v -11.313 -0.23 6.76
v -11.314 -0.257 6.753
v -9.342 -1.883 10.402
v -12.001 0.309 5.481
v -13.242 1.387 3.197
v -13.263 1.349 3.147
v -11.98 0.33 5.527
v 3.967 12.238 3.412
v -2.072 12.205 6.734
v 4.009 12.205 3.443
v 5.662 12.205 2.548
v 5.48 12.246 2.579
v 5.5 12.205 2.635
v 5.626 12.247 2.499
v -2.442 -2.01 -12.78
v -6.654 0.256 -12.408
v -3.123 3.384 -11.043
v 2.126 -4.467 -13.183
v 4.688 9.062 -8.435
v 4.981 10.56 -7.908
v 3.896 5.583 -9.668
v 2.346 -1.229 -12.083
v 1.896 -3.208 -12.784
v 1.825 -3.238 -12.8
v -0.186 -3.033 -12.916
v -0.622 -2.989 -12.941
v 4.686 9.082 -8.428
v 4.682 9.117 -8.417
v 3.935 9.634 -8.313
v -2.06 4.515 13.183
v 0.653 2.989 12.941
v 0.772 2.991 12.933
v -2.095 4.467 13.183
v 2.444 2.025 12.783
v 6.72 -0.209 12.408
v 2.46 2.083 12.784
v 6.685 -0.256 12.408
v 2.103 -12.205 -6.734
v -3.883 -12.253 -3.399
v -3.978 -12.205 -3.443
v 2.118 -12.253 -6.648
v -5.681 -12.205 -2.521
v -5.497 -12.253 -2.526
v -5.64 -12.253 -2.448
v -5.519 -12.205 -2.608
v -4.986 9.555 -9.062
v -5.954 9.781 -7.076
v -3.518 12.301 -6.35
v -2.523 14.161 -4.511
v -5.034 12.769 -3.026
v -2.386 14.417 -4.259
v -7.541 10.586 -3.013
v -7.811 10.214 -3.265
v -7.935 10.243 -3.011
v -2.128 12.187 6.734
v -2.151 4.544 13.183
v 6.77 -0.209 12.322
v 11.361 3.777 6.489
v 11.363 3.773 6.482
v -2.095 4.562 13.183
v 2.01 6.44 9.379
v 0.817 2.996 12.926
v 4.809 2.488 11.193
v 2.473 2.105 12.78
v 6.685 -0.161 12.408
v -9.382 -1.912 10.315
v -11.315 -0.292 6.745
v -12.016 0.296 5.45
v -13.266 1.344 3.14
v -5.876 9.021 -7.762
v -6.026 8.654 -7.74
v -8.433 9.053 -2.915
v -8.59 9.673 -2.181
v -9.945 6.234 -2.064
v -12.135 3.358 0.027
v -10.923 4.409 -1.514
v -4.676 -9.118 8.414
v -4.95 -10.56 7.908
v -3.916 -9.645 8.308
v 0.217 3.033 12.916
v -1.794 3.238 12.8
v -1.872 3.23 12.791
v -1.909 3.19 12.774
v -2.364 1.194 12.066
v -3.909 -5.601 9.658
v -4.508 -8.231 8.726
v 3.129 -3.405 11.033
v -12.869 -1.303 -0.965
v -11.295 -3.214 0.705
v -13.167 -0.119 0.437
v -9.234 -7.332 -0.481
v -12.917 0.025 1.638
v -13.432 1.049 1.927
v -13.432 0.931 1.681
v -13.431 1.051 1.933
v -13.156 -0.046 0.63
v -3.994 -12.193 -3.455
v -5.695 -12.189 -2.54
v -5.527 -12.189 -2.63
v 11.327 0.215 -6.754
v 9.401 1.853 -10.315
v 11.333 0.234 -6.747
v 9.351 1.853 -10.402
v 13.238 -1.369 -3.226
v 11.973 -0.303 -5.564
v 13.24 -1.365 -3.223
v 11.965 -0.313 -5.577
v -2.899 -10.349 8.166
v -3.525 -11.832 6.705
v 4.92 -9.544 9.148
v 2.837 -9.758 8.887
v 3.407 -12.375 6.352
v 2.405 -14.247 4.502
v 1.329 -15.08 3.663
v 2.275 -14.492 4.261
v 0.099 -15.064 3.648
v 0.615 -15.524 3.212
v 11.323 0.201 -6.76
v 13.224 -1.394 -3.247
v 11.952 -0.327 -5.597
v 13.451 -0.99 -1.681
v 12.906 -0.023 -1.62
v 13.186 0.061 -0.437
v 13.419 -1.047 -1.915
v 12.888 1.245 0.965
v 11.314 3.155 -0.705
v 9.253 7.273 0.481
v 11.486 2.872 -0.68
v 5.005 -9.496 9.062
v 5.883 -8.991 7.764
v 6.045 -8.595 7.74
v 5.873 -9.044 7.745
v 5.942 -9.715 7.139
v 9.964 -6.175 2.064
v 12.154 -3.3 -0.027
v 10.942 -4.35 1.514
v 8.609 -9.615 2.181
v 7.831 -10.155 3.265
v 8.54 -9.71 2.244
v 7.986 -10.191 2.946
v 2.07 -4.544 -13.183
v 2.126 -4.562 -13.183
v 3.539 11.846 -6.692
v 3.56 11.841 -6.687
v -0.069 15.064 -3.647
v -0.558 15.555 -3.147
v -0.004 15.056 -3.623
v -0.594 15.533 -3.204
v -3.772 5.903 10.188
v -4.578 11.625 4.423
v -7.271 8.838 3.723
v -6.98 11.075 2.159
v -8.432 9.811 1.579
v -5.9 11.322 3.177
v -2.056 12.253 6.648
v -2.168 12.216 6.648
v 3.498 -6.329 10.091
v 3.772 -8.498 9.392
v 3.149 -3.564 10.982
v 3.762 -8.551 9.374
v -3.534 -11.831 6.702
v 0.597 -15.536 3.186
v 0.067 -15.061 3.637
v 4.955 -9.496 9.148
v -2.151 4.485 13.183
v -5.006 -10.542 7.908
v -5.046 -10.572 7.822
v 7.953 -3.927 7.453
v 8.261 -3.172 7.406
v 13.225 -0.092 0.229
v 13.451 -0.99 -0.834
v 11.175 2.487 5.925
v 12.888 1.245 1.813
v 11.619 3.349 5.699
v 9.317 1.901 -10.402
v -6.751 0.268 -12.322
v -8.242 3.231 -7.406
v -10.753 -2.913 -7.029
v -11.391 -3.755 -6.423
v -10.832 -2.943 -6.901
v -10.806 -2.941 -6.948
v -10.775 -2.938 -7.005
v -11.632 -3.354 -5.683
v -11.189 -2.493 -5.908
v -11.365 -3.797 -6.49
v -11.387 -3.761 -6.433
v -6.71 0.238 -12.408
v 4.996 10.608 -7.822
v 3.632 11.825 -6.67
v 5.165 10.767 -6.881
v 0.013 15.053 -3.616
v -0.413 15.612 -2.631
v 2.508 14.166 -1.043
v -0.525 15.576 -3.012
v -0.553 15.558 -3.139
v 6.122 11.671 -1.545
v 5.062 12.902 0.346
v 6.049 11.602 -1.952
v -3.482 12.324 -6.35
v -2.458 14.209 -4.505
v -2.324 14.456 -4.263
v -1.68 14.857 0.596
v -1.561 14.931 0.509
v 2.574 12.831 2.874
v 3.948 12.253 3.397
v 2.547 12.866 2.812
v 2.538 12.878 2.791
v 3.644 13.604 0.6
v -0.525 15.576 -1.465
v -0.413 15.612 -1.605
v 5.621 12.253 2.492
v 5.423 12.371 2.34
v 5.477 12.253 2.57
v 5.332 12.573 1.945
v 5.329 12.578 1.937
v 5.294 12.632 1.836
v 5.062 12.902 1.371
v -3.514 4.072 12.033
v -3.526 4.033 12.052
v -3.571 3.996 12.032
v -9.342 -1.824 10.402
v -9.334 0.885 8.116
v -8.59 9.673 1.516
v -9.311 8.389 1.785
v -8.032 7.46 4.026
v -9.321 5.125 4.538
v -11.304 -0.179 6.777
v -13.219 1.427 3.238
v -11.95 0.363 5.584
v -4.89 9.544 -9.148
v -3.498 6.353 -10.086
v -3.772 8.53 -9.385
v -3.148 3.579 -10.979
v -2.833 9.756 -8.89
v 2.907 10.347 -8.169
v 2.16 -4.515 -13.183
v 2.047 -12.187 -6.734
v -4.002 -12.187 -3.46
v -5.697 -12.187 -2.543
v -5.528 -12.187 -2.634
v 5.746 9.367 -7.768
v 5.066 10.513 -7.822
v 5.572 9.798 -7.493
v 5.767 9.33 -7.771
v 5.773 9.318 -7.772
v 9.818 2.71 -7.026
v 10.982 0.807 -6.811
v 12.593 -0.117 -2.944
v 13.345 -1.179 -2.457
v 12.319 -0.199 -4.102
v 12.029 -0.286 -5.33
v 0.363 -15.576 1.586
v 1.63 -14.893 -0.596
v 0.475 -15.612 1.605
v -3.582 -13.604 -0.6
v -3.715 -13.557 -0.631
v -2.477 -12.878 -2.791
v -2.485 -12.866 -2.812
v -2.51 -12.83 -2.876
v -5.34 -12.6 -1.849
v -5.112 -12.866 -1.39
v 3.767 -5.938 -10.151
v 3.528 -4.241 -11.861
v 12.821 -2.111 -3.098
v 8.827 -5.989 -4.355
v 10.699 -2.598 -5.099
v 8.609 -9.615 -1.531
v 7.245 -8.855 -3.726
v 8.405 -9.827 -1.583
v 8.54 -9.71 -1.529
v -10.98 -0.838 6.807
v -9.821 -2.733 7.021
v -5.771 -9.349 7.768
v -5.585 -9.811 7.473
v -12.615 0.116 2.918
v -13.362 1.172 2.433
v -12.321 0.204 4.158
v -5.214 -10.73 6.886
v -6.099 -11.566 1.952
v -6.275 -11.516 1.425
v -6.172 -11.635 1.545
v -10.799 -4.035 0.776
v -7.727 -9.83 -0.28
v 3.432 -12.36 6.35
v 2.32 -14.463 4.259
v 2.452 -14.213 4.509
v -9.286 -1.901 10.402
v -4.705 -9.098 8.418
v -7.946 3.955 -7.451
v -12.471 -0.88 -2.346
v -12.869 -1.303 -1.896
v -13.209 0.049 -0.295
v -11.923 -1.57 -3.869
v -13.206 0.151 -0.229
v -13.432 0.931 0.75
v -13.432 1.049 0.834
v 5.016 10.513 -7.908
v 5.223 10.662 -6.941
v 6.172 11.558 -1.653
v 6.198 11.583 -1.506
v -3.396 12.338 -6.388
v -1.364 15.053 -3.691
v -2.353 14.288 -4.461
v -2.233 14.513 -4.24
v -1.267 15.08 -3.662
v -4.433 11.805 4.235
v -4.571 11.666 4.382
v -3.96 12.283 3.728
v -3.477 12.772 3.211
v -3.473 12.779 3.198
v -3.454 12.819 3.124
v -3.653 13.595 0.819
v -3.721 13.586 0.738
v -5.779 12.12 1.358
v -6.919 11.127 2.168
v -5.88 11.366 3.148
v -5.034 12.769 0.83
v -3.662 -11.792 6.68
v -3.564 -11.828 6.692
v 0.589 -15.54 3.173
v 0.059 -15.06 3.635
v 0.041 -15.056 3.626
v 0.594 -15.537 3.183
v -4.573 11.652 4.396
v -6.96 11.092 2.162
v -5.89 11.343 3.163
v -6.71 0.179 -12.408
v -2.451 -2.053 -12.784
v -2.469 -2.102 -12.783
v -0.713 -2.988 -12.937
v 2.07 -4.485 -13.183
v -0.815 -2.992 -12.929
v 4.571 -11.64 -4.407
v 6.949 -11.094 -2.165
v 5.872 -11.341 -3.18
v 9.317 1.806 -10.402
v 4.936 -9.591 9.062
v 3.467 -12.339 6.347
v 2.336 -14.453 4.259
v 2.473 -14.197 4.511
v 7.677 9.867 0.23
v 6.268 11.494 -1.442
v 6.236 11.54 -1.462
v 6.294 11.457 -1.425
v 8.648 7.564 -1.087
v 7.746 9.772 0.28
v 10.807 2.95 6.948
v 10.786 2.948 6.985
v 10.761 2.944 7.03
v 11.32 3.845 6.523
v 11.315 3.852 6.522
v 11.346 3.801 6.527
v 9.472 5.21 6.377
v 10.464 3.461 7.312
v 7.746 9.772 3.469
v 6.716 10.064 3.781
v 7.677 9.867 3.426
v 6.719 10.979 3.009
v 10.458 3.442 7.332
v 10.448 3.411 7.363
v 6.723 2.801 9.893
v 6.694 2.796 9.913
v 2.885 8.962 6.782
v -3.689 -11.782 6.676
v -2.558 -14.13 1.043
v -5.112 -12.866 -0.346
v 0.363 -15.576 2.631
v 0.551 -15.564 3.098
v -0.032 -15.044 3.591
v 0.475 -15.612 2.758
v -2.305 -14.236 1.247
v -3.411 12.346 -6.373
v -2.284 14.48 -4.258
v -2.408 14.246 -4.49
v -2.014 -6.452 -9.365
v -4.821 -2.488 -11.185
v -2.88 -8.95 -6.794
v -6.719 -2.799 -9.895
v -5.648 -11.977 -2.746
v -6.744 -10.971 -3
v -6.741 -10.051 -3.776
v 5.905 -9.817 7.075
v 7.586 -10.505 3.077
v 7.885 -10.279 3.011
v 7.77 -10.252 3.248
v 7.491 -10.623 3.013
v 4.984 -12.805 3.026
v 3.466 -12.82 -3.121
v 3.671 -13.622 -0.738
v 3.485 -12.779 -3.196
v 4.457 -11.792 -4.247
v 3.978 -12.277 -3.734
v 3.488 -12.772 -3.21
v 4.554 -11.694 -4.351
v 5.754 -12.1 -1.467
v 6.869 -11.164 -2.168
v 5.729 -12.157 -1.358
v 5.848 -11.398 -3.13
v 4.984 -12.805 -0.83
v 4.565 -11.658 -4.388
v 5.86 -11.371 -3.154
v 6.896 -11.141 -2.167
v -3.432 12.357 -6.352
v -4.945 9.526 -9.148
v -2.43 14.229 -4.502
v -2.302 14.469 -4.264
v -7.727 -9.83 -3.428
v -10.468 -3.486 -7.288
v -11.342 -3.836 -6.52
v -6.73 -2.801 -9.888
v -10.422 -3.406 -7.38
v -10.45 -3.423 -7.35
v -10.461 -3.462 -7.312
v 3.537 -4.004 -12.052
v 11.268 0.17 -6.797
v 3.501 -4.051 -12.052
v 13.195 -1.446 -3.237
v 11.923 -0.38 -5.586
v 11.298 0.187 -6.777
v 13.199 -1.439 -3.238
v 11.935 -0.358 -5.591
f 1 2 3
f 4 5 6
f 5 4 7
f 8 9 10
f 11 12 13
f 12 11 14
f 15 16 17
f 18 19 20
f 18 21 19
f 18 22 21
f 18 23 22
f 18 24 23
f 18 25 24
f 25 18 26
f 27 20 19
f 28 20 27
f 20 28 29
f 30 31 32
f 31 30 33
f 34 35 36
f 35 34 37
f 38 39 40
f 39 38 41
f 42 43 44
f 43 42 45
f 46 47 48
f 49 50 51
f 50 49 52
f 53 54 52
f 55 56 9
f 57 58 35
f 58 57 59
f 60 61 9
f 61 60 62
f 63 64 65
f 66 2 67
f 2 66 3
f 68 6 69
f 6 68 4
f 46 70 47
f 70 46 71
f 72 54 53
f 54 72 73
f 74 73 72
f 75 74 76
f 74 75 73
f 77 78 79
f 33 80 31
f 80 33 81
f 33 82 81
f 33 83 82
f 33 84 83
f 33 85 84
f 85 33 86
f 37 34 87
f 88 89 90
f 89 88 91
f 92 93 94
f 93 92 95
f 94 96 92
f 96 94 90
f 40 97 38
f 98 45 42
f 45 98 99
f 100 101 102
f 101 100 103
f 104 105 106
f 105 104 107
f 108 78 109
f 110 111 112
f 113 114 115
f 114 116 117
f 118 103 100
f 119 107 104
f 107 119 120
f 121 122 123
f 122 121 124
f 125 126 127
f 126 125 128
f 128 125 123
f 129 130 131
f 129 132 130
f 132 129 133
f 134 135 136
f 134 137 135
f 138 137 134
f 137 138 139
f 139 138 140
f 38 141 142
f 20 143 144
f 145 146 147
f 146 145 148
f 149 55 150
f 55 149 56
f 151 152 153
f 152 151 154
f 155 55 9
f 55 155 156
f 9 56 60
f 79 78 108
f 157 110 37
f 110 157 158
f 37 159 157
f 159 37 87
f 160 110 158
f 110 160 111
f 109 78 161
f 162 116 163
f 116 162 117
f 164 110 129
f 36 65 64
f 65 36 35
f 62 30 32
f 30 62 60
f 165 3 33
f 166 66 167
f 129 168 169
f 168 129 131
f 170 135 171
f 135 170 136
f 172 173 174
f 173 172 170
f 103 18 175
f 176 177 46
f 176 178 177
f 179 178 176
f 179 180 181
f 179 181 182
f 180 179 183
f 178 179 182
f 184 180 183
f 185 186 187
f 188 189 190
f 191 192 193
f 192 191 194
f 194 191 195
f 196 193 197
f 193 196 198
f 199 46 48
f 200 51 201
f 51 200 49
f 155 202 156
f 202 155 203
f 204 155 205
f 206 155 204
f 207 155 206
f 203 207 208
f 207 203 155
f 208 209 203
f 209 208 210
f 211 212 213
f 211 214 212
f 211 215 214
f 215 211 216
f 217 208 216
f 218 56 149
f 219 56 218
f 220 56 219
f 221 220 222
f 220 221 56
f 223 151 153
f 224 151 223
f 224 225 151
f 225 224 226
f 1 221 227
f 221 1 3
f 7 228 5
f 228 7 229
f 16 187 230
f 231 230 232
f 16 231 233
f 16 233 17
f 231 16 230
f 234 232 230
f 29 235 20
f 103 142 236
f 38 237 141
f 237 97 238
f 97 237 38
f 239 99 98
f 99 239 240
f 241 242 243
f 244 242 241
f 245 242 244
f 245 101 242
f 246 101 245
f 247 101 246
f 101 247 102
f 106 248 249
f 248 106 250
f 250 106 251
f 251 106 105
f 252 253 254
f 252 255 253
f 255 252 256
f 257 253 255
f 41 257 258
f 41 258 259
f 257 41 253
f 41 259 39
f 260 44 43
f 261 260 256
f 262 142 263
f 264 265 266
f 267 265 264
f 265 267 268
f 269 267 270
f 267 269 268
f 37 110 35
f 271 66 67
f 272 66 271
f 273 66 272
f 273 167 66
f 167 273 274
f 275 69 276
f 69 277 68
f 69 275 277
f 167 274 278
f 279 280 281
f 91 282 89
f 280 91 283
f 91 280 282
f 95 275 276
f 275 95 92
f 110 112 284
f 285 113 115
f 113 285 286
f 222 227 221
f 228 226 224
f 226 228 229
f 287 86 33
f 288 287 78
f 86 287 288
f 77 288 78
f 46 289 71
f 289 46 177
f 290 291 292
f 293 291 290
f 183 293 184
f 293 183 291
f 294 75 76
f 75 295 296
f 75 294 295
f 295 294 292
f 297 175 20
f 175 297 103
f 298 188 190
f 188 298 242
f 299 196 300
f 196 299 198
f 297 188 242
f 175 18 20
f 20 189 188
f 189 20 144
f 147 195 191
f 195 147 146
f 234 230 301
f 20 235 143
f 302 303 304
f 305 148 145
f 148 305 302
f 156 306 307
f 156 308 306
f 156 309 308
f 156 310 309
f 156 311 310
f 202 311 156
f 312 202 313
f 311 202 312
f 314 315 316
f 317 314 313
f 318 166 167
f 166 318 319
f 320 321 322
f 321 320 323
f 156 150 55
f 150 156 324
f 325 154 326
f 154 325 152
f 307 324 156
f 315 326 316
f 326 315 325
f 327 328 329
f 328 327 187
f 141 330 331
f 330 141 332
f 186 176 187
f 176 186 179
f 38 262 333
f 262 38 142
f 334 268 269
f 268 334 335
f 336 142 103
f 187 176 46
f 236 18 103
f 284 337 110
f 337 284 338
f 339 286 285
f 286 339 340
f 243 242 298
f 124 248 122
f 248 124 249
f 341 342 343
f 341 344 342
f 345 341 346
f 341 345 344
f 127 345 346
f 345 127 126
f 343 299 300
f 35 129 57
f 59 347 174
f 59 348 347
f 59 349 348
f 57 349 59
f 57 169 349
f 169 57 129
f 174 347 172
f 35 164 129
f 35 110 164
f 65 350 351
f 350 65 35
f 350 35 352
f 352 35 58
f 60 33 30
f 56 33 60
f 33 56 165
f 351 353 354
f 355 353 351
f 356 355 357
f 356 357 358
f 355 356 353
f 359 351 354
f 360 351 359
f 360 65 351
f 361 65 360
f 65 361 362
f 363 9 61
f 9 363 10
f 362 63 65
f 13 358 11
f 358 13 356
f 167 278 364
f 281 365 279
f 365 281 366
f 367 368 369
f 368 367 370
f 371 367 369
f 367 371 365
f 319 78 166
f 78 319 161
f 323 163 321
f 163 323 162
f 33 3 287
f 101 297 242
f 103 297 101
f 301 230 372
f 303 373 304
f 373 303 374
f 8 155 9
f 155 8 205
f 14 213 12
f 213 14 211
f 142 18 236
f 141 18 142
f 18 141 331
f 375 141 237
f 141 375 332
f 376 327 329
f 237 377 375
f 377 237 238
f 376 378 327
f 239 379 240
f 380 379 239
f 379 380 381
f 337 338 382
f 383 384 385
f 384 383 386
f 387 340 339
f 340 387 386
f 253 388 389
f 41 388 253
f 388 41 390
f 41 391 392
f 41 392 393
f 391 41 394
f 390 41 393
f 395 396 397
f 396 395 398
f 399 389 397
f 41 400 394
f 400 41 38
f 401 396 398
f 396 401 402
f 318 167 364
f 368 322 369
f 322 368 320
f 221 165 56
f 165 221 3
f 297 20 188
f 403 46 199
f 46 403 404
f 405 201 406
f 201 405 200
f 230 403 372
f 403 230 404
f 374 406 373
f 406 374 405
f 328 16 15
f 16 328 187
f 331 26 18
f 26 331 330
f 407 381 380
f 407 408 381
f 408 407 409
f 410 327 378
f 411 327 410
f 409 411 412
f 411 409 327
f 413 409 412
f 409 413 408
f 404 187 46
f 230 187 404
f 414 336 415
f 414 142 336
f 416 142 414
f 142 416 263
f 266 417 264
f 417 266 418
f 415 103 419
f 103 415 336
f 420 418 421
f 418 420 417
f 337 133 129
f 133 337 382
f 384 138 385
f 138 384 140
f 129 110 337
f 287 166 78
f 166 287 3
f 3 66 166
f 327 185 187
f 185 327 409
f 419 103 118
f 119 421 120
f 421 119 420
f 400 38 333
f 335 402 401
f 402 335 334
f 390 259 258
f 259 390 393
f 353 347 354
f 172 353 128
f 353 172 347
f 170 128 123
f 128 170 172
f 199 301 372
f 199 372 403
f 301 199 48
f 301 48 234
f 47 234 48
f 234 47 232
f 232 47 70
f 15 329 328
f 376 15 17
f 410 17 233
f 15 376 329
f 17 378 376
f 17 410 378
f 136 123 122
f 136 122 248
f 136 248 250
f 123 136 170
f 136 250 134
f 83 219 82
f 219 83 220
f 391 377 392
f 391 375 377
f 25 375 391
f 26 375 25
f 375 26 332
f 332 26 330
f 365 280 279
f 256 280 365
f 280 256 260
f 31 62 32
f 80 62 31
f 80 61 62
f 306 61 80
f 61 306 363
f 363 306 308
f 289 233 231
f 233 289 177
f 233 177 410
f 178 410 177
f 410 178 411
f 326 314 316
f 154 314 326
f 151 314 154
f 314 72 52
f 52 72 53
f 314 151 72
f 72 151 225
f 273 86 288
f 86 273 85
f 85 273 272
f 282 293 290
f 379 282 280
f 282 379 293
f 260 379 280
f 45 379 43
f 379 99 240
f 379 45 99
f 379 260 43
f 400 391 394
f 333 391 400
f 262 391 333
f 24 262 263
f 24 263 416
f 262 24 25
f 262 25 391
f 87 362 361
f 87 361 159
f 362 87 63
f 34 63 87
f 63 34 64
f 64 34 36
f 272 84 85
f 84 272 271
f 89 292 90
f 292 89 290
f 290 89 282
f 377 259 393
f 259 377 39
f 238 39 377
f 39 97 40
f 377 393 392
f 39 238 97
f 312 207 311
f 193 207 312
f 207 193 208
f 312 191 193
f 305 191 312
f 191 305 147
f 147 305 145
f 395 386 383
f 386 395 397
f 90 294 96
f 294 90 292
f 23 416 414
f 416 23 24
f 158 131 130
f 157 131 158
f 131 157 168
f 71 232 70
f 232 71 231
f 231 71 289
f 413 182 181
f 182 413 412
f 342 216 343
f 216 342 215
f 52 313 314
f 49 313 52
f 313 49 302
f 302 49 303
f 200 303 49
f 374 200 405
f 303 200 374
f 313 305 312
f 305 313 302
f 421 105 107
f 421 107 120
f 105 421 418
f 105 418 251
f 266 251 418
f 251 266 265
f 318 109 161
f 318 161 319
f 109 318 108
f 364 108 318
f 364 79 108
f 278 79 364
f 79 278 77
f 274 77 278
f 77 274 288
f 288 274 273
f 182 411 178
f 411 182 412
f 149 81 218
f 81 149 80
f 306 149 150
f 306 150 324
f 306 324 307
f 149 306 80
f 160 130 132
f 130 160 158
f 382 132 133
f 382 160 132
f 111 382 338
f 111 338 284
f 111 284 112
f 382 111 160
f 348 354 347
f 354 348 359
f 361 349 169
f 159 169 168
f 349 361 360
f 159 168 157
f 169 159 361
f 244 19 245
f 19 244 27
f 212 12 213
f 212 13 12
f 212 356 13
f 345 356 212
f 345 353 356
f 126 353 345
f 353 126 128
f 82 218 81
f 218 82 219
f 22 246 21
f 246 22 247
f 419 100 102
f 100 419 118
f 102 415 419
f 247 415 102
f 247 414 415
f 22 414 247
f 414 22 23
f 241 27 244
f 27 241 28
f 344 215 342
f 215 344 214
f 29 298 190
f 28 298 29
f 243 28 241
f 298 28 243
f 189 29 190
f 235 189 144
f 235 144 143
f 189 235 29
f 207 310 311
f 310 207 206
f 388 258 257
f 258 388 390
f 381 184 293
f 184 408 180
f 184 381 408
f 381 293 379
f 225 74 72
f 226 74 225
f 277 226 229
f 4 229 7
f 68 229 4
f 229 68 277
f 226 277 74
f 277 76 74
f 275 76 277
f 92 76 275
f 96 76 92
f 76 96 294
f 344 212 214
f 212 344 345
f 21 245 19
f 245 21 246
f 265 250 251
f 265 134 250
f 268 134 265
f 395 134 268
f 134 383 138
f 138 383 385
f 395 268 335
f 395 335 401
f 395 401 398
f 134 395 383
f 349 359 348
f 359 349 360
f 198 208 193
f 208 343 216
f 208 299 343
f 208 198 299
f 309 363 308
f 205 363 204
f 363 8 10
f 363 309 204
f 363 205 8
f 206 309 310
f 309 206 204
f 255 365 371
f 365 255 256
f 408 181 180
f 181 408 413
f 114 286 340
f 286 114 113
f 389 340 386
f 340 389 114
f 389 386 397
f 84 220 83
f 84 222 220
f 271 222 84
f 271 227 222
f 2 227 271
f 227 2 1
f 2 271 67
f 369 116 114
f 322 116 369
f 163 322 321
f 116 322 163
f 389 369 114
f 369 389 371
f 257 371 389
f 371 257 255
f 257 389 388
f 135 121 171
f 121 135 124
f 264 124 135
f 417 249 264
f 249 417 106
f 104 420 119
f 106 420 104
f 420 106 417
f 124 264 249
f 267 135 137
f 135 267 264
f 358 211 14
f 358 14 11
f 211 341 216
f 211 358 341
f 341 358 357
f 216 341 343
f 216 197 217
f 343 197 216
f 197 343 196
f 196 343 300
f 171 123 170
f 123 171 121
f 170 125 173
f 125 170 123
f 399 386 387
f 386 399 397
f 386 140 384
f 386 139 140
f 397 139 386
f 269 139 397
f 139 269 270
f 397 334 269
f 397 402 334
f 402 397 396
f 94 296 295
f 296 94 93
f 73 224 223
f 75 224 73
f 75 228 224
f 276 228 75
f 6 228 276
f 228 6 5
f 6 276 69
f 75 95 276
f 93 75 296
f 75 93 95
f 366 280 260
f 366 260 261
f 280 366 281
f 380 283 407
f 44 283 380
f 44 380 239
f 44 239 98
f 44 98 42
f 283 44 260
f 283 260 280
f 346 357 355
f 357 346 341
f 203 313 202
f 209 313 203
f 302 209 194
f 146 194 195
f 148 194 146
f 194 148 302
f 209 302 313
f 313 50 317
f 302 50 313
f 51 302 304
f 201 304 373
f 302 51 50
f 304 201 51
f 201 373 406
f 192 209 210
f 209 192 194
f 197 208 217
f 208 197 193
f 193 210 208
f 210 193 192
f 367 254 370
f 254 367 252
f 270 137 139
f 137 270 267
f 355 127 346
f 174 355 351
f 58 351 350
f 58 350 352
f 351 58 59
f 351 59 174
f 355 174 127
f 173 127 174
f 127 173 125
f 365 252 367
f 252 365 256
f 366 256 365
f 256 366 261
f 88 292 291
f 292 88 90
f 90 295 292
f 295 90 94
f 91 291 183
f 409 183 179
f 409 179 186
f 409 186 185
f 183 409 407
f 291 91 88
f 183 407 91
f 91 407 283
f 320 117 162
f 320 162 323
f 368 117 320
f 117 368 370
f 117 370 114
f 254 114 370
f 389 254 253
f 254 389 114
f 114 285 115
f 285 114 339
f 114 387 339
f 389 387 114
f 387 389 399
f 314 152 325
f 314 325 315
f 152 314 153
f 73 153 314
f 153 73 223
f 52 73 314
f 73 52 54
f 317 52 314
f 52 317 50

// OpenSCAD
// Auto-generated OpenSCAD file

    inner_points = 10*[[-1.3350698747901557, 0.0990218864340161, -0.41389441527673243], [0.8508637948042702, -0.9614534950051333, 0.5613942208431721], [-0.8508637948042702, 0.9614534950051333, -0.5613942208431721], [1.3350698747901557, -0.0990218864340161, 0.41389441527673243], [-0.07512626496626917, -0.194799963559733, -1.385617014211274], [0.7598260996660189, -0.5998655150369786, -1.013089904054999], [-0.7598260996660189, 0.5998655150369786, 1.013089904054999], [0.07512626496626917, 0.194799963559733, 1.385617014211274], [-0.5030679550992645, -1.280705233674586, -0.26503250471063], [0.7646000198631342, 0.9771700305368443, -0.6511920090175702], [-0.7646000198631342, -0.9771700305368443, 0.6511920090175702], [0.5030679550992645, 1.280705233674586, 0.26503250471063], [-0.8556377150013853, -0.6155820505686895, -0.9232921158806008], [0.4953435899607525, -1.2709918805305933, -0.3205305899169714], [-0.07217582002487244, 0.7798616050716232, -1.1619518146211012], [1.2788054849372654, 0.12445177510971961, -0.5591902886574719], [-1.2788054849372654, -0.12445177510971961, 0.5591902886574719], [0.07217582002487244, -0.7798616050716232, 1.1619518146211012], [-0.4953435899607525, 1.2709918805305933, 0.3205305899169714], [0.8556377150013853, 0.6155820505686895, 0.9232921158806008], [0.0443746617590165, -1.5516849543996245, 0.5267228692547999], [-0.0443746617590165, 1.5516849543996245, -0.5267228692547999]];

    outer_points = 10*[[0.6669622706403558, -0.020873051468661752, 1.2321733387908815], [-0.49050024063185305, 0.9496265660238541, -0.9061701775076568], [0.49050024063185305, -0.9496265660238541, 0.9061701775076568], [-0.6669622706403558, 0.020873051468661752, -1.2321733387908815], [1.372245669008736, -0.18534893390668453, -0.2147395821660355], [0.9301343304065605, 0.18534893390668453, -1.0315141257691125], [-0.9301343304065605, -0.18534893390668453, 1.0315141257691125], [-1.372245669008736, 0.18534893390668453, 0.2147395821660355], [0.6707072485223723, 1.215754134138207, 0.18873039942687714], [0.20872365623630781, -1.215754134138207, -0.6647569572525192], [-0.20872365623630781, 1.215754134138207, 0.6647569572525192], [-0.6707072485223723, -1.215754134138207, -0.18873039942687714], [1.2119109148021057, 0.4514765020210374, 0.5394130089910635], [0.4965597421320721, 1.0512782517001842, -0.782155963704398], [0.926389352524544, -1.0512782517001842, 0.011928813594892007], [0.21103817985451057, -0.4514765020210374, -1.3096401591005695], [-0.21103817985451057, 0.4514765020210374, 1.3096401591005695], [-0.926389352524544, 1.0512782517001842, -0.011928813594892007], [-0.4965597421320721, -1.0512782517001842, 0.782155963704398], [-1.2119109148021057, -0.4514765020210374, -0.5394130089910635], [-0.1349496014656266, 1.6145478368697694, -0.24931140534644022], [0.1349496014656266, -1.6145478368697694, 0.24931140534644022]];

    // Convex hull for inner set (I)
    module inner_hull() {
        hull() {
            for (p = inner_points) {
                translate(p) sphere(r=0.1);
            }
        }
    }

    // Convex hull for outer set (O) minus inner hull (O \ I)
    module outer_minus_inner() {
        difference() {
            hull() {
                for (p = outer_points) {
                    translate(p) sphere(r=0.1);
                }
            }
            inner_hull(); // Subtract inner hull
        }
    }

    // Convex hull for outer set (O) minus all translated inner hulls
    module outer_minus_AllTranslationInner() {
        difference() {
            hull() {
                for (p = outer_points) {
                    translate(p) sphere(r=0.1);
                }
            }
            hull() {
                translate([0,0,50]) inner_hull();
                translate([0,0,-50]) inner_hull();
            }; // Subtract translated inner hulls
        }
    }

    // Difference between outer_minus_inner and outer_minus_AllTranslationInner
    module outer_minus_inner_diff() {
        difference() {
            // Outer minus inner
            difference() {
                hull() {
                    for (p = outer_points) {
                        translate(p) sphere(r=0.1);
                    }
                }
                inner_hull();
            }

            // Subtract Outer minus AllTranslationInner
            difference() {
                hull() {
                    for (p = outer_points) {
                        translate(p) sphere(r=0.1);
                    }
                }
                hull() {
                    translate([0,0,50]) inner_hull();
                    translate([0,0,-50]) inner_hull();
                };
            }
        }
    }

    // Rendering all with colors applied
    color([1, 1, 0, 1]) outer_minus_inner_diff(); // Opaque yellow
    
